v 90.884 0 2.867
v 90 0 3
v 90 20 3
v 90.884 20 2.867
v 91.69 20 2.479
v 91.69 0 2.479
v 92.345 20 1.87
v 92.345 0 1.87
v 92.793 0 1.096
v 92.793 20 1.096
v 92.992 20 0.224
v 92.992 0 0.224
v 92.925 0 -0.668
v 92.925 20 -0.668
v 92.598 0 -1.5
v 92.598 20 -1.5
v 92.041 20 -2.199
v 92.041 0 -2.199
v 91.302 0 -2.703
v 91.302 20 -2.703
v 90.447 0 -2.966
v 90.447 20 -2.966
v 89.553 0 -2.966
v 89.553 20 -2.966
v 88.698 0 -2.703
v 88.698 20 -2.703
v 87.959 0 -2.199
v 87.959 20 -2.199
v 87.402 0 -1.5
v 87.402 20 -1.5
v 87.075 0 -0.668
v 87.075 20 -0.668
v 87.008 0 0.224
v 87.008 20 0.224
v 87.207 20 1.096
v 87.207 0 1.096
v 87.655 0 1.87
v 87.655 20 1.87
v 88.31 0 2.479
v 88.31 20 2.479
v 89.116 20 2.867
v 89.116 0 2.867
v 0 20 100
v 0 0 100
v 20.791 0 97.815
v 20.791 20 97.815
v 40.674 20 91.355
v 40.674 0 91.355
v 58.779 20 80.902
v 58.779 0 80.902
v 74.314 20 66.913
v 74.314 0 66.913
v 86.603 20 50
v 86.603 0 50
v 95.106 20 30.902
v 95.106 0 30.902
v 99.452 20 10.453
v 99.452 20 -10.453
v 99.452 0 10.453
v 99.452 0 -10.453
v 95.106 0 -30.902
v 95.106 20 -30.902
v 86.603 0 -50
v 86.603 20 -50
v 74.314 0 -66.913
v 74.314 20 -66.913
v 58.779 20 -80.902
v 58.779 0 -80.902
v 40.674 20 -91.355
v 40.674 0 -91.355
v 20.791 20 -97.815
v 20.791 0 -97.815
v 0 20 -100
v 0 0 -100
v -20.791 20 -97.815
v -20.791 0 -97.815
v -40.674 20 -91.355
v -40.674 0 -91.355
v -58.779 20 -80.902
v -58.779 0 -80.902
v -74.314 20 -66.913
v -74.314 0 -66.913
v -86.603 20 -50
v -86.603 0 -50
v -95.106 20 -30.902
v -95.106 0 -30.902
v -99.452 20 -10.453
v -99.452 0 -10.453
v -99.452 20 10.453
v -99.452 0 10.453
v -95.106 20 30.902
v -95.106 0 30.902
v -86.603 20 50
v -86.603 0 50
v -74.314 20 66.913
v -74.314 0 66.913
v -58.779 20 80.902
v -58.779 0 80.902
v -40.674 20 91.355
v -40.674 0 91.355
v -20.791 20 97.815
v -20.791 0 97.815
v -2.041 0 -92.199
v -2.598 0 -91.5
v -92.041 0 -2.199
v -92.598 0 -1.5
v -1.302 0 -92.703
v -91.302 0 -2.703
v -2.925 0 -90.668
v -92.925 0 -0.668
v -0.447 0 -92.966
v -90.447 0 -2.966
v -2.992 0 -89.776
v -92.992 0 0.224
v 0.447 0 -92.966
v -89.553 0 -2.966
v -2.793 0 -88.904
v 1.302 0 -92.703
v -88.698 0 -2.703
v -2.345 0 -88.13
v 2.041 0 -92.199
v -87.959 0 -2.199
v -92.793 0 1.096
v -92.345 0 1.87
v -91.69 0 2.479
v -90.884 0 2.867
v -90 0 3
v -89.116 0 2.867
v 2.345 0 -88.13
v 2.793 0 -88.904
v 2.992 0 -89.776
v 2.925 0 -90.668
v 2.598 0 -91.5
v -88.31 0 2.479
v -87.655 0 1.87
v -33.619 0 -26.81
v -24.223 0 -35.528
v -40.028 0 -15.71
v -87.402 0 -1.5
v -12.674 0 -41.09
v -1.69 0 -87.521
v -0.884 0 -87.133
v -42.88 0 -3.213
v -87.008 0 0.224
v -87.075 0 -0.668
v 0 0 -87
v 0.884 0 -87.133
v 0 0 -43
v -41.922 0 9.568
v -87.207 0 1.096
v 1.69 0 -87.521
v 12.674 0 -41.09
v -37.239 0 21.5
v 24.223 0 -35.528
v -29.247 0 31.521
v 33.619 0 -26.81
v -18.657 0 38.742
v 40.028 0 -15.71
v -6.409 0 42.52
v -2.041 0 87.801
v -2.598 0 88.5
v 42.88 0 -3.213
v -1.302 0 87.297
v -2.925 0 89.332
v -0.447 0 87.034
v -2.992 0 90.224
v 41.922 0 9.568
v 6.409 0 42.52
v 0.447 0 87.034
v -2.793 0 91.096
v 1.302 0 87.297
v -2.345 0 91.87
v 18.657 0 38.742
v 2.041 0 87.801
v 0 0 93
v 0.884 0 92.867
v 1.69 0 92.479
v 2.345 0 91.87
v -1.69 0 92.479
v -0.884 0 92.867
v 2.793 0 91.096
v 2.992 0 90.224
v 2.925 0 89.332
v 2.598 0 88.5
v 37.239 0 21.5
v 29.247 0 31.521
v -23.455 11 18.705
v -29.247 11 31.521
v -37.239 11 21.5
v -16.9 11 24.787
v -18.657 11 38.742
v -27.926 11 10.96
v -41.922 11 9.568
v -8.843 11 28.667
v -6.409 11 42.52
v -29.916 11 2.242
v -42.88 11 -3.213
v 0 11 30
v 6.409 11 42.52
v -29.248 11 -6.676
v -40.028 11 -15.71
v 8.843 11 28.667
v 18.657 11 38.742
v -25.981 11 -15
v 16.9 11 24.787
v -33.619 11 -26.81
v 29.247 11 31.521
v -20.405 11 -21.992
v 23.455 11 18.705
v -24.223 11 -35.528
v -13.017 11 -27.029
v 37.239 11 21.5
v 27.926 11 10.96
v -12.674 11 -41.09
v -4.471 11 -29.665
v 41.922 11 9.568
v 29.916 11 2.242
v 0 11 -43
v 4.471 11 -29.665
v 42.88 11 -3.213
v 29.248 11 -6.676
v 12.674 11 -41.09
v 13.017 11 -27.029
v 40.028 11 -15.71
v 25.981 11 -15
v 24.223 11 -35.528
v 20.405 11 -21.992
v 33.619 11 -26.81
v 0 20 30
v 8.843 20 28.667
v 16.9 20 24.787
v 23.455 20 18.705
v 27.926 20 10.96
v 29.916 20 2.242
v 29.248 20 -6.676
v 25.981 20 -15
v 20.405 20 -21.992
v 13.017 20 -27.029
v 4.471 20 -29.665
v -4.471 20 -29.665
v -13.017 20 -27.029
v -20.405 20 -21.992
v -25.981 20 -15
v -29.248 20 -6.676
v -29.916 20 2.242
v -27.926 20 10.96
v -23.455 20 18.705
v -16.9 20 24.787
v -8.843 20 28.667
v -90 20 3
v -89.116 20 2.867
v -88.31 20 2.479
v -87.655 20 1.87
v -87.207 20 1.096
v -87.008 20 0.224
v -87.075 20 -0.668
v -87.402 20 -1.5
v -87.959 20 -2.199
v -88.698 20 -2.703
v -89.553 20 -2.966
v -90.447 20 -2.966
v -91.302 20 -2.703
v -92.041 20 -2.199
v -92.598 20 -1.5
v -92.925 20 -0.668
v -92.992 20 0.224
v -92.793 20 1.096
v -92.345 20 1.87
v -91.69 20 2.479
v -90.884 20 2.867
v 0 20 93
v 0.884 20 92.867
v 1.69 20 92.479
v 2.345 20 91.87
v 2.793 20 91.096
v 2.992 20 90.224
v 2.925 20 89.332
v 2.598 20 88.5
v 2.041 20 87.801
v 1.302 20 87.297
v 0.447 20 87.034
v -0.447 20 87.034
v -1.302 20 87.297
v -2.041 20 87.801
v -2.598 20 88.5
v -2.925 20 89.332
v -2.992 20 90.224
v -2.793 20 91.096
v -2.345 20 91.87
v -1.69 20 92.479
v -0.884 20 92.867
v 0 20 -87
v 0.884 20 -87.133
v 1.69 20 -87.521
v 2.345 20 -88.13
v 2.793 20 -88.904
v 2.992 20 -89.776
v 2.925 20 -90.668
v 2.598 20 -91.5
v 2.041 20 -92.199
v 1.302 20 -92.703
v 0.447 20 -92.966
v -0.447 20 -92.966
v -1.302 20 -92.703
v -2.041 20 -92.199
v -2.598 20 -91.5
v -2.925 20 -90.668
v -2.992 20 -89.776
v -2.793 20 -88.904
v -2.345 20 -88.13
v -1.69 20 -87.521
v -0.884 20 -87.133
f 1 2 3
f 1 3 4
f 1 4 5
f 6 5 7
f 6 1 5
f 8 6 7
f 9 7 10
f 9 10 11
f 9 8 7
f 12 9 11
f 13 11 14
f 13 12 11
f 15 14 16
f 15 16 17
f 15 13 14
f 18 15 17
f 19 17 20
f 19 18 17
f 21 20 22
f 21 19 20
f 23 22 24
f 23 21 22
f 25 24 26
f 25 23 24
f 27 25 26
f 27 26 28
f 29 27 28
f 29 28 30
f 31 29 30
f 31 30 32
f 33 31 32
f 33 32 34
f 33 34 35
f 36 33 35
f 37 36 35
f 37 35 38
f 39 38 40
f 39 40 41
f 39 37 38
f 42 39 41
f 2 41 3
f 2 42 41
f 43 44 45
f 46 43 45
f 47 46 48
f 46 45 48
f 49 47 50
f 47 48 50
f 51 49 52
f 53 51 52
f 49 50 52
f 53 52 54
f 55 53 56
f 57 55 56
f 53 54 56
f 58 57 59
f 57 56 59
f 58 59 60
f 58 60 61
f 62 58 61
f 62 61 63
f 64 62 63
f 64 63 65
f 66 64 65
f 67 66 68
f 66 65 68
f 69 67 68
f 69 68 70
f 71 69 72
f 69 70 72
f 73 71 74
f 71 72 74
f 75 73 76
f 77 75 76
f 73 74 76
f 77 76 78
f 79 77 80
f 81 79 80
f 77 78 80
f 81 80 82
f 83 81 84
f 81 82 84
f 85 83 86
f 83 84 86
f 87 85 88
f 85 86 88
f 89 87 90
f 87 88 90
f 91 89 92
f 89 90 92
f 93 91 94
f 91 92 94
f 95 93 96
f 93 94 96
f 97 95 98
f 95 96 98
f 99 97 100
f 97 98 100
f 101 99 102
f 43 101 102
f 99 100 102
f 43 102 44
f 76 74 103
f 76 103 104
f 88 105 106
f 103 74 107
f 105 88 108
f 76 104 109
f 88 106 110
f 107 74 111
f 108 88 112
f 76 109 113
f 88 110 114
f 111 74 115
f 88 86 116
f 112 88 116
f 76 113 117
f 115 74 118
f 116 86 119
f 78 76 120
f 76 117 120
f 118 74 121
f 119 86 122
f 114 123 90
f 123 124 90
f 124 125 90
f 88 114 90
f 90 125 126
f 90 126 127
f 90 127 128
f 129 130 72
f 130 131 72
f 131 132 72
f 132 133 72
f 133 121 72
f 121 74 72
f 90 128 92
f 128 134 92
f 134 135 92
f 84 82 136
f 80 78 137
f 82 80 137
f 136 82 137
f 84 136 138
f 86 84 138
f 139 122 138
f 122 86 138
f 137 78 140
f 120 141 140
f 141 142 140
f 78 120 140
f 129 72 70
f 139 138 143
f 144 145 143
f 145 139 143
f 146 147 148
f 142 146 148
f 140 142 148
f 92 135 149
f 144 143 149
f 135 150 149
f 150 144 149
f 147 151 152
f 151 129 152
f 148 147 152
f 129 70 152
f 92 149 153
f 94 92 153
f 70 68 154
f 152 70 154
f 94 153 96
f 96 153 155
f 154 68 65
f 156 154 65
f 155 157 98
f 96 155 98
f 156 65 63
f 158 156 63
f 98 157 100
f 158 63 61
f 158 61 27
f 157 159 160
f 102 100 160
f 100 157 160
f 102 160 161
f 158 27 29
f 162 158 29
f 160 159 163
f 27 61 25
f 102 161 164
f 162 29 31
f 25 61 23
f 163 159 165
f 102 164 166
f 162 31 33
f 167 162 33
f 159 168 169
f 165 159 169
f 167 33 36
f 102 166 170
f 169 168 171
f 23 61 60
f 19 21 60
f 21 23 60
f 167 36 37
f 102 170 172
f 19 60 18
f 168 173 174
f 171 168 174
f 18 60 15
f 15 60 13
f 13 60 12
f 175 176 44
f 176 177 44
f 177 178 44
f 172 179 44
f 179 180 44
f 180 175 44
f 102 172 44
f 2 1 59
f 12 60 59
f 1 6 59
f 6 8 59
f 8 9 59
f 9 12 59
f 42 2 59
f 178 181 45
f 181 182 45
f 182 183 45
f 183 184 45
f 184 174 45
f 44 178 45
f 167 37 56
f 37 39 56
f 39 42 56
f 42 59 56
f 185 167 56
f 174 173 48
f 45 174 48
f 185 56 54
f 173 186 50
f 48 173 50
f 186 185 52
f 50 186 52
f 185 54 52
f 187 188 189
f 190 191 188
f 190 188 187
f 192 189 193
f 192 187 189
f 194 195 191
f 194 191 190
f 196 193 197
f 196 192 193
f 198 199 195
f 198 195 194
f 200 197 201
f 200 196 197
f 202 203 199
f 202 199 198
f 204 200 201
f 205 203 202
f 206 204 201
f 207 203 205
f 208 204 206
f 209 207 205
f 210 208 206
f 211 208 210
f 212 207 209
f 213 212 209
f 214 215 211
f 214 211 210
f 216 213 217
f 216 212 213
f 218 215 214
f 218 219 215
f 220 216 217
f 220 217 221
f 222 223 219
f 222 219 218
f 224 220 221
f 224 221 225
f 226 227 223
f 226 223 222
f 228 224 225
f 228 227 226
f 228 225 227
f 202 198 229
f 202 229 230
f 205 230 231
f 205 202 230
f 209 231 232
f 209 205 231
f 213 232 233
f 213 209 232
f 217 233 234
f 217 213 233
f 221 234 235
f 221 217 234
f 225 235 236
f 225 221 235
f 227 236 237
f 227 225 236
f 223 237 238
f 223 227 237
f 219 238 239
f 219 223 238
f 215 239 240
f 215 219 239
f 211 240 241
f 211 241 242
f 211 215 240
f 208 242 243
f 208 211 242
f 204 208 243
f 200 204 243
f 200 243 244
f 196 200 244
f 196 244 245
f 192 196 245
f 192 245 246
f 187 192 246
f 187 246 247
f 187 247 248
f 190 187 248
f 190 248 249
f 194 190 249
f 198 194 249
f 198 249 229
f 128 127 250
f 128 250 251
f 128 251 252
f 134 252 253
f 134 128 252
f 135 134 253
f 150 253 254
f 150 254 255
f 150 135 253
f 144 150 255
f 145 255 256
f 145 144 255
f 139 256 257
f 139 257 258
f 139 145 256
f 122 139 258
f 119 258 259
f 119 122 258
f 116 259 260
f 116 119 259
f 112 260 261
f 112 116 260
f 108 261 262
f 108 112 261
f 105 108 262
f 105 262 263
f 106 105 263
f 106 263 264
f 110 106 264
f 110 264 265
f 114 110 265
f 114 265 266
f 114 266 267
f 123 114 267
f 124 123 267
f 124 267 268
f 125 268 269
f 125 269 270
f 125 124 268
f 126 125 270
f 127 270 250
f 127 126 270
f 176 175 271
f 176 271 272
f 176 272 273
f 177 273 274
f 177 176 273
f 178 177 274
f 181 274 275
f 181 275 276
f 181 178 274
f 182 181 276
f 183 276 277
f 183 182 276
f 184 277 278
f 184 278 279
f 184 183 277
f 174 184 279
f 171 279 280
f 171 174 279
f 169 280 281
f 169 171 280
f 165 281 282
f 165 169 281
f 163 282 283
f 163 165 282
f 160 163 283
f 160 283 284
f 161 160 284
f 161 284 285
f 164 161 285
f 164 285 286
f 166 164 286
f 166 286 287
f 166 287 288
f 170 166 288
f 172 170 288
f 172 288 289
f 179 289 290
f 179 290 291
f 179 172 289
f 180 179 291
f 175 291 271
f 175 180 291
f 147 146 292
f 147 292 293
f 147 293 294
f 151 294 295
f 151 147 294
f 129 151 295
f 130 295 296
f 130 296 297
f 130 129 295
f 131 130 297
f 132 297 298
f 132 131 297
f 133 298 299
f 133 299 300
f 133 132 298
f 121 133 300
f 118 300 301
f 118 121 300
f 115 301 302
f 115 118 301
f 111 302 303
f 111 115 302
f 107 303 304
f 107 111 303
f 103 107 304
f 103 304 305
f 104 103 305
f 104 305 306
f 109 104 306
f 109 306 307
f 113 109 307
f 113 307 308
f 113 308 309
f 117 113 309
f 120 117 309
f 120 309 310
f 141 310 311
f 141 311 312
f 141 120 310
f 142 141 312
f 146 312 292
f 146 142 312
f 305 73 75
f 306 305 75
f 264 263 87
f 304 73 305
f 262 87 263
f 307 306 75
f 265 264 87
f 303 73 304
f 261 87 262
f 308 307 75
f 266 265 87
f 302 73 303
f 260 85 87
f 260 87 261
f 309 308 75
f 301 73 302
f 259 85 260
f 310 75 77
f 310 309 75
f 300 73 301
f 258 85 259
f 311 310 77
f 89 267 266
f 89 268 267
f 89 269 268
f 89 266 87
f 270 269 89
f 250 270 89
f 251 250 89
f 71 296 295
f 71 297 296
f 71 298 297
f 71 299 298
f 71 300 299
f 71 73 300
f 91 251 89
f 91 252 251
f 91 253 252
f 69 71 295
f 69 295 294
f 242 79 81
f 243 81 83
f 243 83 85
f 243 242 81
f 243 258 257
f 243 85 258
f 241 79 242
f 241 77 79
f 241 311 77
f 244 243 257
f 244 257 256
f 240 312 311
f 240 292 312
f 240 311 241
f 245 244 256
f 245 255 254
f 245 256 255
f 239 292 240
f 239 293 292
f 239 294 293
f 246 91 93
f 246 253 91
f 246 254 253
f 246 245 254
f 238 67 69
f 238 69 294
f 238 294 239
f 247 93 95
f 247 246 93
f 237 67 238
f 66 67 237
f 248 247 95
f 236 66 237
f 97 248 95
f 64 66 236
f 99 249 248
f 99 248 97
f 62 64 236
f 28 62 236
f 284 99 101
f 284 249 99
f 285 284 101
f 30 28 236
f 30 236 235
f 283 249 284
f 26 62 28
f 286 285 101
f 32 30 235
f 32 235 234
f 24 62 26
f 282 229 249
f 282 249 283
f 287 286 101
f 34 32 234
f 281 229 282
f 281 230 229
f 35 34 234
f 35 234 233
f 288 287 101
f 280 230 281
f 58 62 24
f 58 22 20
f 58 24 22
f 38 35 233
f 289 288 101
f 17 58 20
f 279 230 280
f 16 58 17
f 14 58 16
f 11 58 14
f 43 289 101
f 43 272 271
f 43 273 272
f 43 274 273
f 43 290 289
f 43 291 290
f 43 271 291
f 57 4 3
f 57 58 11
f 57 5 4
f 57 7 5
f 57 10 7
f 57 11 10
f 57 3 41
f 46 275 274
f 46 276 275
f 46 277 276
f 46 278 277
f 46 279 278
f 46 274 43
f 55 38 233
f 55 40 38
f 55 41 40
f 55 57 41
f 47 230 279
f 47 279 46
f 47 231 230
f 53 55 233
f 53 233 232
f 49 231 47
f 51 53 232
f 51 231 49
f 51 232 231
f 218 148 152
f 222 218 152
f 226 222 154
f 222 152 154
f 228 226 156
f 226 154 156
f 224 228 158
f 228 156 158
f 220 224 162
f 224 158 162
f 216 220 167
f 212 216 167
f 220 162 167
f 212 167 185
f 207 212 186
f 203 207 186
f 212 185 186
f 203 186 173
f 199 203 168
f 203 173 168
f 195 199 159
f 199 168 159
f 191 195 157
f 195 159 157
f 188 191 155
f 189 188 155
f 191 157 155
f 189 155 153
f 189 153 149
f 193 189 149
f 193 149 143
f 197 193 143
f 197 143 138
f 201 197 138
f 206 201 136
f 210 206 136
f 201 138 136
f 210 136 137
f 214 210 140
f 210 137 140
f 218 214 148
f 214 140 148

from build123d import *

# Parameters (mm, degrees)
SKETCH_2_R          = 100
SKETCH_2_R_2        = 3
SKETCH_2_R_3        = 30
EXTRUDE_1_DEPTH     = 20
SKETCH_3_R          = 43
CUT_EXTRUDE_1_DEPTH = 11


with BuildPart() as part:
    # 草图2 → 凸台-拉伸1 (new body)
    with BuildSketch(Plane(origin=(0, 0, 0), x_dir=(1, 0, 0), z_dir=(0, 1, 0))):
        with Locations(Location((0, 0, 0), (0, 0, 270))):
            Circle(SKETCH_2_R)
        with Locations(Location((0, 90, 0), (0, 0, 270))):
            Circle(SKETCH_2_R_2, mode=Mode.SUBTRACT)
        with Locations(Location((90, 0, 0), (0, 0, 270))):
            Circle(SKETCH_2_R_2, mode=Mode.SUBTRACT)
        with Locations(Location((0, -90, 0), (0, 0, 270))):
            Circle(SKETCH_2_R_2, mode=Mode.SUBTRACT)
        with Locations(Location((-90, 0, 0), (0, 0, 270))):
            Circle(SKETCH_2_R_2, mode=Mode.SUBTRACT)
        with Locations(Location((0, 0, 0), (0, 0, 270))):
            Circle(SKETCH_2_R_3, mode=Mode.SUBTRACT)
    extrude(amount=EXTRUDE_1_DEPTH)

    # 草图3 → 切除-拉伸1 (cut)
    with BuildSketch(Plane.XZ):
        with Locations(Location((0, 0, 0), (0, 0, 270))):
            Circle(SKETCH_3_R)
    extrude(amount=-CUT_EXTRUDE_1_DEPTH, mode=Mode.SUBTRACT)


solid = part.part
